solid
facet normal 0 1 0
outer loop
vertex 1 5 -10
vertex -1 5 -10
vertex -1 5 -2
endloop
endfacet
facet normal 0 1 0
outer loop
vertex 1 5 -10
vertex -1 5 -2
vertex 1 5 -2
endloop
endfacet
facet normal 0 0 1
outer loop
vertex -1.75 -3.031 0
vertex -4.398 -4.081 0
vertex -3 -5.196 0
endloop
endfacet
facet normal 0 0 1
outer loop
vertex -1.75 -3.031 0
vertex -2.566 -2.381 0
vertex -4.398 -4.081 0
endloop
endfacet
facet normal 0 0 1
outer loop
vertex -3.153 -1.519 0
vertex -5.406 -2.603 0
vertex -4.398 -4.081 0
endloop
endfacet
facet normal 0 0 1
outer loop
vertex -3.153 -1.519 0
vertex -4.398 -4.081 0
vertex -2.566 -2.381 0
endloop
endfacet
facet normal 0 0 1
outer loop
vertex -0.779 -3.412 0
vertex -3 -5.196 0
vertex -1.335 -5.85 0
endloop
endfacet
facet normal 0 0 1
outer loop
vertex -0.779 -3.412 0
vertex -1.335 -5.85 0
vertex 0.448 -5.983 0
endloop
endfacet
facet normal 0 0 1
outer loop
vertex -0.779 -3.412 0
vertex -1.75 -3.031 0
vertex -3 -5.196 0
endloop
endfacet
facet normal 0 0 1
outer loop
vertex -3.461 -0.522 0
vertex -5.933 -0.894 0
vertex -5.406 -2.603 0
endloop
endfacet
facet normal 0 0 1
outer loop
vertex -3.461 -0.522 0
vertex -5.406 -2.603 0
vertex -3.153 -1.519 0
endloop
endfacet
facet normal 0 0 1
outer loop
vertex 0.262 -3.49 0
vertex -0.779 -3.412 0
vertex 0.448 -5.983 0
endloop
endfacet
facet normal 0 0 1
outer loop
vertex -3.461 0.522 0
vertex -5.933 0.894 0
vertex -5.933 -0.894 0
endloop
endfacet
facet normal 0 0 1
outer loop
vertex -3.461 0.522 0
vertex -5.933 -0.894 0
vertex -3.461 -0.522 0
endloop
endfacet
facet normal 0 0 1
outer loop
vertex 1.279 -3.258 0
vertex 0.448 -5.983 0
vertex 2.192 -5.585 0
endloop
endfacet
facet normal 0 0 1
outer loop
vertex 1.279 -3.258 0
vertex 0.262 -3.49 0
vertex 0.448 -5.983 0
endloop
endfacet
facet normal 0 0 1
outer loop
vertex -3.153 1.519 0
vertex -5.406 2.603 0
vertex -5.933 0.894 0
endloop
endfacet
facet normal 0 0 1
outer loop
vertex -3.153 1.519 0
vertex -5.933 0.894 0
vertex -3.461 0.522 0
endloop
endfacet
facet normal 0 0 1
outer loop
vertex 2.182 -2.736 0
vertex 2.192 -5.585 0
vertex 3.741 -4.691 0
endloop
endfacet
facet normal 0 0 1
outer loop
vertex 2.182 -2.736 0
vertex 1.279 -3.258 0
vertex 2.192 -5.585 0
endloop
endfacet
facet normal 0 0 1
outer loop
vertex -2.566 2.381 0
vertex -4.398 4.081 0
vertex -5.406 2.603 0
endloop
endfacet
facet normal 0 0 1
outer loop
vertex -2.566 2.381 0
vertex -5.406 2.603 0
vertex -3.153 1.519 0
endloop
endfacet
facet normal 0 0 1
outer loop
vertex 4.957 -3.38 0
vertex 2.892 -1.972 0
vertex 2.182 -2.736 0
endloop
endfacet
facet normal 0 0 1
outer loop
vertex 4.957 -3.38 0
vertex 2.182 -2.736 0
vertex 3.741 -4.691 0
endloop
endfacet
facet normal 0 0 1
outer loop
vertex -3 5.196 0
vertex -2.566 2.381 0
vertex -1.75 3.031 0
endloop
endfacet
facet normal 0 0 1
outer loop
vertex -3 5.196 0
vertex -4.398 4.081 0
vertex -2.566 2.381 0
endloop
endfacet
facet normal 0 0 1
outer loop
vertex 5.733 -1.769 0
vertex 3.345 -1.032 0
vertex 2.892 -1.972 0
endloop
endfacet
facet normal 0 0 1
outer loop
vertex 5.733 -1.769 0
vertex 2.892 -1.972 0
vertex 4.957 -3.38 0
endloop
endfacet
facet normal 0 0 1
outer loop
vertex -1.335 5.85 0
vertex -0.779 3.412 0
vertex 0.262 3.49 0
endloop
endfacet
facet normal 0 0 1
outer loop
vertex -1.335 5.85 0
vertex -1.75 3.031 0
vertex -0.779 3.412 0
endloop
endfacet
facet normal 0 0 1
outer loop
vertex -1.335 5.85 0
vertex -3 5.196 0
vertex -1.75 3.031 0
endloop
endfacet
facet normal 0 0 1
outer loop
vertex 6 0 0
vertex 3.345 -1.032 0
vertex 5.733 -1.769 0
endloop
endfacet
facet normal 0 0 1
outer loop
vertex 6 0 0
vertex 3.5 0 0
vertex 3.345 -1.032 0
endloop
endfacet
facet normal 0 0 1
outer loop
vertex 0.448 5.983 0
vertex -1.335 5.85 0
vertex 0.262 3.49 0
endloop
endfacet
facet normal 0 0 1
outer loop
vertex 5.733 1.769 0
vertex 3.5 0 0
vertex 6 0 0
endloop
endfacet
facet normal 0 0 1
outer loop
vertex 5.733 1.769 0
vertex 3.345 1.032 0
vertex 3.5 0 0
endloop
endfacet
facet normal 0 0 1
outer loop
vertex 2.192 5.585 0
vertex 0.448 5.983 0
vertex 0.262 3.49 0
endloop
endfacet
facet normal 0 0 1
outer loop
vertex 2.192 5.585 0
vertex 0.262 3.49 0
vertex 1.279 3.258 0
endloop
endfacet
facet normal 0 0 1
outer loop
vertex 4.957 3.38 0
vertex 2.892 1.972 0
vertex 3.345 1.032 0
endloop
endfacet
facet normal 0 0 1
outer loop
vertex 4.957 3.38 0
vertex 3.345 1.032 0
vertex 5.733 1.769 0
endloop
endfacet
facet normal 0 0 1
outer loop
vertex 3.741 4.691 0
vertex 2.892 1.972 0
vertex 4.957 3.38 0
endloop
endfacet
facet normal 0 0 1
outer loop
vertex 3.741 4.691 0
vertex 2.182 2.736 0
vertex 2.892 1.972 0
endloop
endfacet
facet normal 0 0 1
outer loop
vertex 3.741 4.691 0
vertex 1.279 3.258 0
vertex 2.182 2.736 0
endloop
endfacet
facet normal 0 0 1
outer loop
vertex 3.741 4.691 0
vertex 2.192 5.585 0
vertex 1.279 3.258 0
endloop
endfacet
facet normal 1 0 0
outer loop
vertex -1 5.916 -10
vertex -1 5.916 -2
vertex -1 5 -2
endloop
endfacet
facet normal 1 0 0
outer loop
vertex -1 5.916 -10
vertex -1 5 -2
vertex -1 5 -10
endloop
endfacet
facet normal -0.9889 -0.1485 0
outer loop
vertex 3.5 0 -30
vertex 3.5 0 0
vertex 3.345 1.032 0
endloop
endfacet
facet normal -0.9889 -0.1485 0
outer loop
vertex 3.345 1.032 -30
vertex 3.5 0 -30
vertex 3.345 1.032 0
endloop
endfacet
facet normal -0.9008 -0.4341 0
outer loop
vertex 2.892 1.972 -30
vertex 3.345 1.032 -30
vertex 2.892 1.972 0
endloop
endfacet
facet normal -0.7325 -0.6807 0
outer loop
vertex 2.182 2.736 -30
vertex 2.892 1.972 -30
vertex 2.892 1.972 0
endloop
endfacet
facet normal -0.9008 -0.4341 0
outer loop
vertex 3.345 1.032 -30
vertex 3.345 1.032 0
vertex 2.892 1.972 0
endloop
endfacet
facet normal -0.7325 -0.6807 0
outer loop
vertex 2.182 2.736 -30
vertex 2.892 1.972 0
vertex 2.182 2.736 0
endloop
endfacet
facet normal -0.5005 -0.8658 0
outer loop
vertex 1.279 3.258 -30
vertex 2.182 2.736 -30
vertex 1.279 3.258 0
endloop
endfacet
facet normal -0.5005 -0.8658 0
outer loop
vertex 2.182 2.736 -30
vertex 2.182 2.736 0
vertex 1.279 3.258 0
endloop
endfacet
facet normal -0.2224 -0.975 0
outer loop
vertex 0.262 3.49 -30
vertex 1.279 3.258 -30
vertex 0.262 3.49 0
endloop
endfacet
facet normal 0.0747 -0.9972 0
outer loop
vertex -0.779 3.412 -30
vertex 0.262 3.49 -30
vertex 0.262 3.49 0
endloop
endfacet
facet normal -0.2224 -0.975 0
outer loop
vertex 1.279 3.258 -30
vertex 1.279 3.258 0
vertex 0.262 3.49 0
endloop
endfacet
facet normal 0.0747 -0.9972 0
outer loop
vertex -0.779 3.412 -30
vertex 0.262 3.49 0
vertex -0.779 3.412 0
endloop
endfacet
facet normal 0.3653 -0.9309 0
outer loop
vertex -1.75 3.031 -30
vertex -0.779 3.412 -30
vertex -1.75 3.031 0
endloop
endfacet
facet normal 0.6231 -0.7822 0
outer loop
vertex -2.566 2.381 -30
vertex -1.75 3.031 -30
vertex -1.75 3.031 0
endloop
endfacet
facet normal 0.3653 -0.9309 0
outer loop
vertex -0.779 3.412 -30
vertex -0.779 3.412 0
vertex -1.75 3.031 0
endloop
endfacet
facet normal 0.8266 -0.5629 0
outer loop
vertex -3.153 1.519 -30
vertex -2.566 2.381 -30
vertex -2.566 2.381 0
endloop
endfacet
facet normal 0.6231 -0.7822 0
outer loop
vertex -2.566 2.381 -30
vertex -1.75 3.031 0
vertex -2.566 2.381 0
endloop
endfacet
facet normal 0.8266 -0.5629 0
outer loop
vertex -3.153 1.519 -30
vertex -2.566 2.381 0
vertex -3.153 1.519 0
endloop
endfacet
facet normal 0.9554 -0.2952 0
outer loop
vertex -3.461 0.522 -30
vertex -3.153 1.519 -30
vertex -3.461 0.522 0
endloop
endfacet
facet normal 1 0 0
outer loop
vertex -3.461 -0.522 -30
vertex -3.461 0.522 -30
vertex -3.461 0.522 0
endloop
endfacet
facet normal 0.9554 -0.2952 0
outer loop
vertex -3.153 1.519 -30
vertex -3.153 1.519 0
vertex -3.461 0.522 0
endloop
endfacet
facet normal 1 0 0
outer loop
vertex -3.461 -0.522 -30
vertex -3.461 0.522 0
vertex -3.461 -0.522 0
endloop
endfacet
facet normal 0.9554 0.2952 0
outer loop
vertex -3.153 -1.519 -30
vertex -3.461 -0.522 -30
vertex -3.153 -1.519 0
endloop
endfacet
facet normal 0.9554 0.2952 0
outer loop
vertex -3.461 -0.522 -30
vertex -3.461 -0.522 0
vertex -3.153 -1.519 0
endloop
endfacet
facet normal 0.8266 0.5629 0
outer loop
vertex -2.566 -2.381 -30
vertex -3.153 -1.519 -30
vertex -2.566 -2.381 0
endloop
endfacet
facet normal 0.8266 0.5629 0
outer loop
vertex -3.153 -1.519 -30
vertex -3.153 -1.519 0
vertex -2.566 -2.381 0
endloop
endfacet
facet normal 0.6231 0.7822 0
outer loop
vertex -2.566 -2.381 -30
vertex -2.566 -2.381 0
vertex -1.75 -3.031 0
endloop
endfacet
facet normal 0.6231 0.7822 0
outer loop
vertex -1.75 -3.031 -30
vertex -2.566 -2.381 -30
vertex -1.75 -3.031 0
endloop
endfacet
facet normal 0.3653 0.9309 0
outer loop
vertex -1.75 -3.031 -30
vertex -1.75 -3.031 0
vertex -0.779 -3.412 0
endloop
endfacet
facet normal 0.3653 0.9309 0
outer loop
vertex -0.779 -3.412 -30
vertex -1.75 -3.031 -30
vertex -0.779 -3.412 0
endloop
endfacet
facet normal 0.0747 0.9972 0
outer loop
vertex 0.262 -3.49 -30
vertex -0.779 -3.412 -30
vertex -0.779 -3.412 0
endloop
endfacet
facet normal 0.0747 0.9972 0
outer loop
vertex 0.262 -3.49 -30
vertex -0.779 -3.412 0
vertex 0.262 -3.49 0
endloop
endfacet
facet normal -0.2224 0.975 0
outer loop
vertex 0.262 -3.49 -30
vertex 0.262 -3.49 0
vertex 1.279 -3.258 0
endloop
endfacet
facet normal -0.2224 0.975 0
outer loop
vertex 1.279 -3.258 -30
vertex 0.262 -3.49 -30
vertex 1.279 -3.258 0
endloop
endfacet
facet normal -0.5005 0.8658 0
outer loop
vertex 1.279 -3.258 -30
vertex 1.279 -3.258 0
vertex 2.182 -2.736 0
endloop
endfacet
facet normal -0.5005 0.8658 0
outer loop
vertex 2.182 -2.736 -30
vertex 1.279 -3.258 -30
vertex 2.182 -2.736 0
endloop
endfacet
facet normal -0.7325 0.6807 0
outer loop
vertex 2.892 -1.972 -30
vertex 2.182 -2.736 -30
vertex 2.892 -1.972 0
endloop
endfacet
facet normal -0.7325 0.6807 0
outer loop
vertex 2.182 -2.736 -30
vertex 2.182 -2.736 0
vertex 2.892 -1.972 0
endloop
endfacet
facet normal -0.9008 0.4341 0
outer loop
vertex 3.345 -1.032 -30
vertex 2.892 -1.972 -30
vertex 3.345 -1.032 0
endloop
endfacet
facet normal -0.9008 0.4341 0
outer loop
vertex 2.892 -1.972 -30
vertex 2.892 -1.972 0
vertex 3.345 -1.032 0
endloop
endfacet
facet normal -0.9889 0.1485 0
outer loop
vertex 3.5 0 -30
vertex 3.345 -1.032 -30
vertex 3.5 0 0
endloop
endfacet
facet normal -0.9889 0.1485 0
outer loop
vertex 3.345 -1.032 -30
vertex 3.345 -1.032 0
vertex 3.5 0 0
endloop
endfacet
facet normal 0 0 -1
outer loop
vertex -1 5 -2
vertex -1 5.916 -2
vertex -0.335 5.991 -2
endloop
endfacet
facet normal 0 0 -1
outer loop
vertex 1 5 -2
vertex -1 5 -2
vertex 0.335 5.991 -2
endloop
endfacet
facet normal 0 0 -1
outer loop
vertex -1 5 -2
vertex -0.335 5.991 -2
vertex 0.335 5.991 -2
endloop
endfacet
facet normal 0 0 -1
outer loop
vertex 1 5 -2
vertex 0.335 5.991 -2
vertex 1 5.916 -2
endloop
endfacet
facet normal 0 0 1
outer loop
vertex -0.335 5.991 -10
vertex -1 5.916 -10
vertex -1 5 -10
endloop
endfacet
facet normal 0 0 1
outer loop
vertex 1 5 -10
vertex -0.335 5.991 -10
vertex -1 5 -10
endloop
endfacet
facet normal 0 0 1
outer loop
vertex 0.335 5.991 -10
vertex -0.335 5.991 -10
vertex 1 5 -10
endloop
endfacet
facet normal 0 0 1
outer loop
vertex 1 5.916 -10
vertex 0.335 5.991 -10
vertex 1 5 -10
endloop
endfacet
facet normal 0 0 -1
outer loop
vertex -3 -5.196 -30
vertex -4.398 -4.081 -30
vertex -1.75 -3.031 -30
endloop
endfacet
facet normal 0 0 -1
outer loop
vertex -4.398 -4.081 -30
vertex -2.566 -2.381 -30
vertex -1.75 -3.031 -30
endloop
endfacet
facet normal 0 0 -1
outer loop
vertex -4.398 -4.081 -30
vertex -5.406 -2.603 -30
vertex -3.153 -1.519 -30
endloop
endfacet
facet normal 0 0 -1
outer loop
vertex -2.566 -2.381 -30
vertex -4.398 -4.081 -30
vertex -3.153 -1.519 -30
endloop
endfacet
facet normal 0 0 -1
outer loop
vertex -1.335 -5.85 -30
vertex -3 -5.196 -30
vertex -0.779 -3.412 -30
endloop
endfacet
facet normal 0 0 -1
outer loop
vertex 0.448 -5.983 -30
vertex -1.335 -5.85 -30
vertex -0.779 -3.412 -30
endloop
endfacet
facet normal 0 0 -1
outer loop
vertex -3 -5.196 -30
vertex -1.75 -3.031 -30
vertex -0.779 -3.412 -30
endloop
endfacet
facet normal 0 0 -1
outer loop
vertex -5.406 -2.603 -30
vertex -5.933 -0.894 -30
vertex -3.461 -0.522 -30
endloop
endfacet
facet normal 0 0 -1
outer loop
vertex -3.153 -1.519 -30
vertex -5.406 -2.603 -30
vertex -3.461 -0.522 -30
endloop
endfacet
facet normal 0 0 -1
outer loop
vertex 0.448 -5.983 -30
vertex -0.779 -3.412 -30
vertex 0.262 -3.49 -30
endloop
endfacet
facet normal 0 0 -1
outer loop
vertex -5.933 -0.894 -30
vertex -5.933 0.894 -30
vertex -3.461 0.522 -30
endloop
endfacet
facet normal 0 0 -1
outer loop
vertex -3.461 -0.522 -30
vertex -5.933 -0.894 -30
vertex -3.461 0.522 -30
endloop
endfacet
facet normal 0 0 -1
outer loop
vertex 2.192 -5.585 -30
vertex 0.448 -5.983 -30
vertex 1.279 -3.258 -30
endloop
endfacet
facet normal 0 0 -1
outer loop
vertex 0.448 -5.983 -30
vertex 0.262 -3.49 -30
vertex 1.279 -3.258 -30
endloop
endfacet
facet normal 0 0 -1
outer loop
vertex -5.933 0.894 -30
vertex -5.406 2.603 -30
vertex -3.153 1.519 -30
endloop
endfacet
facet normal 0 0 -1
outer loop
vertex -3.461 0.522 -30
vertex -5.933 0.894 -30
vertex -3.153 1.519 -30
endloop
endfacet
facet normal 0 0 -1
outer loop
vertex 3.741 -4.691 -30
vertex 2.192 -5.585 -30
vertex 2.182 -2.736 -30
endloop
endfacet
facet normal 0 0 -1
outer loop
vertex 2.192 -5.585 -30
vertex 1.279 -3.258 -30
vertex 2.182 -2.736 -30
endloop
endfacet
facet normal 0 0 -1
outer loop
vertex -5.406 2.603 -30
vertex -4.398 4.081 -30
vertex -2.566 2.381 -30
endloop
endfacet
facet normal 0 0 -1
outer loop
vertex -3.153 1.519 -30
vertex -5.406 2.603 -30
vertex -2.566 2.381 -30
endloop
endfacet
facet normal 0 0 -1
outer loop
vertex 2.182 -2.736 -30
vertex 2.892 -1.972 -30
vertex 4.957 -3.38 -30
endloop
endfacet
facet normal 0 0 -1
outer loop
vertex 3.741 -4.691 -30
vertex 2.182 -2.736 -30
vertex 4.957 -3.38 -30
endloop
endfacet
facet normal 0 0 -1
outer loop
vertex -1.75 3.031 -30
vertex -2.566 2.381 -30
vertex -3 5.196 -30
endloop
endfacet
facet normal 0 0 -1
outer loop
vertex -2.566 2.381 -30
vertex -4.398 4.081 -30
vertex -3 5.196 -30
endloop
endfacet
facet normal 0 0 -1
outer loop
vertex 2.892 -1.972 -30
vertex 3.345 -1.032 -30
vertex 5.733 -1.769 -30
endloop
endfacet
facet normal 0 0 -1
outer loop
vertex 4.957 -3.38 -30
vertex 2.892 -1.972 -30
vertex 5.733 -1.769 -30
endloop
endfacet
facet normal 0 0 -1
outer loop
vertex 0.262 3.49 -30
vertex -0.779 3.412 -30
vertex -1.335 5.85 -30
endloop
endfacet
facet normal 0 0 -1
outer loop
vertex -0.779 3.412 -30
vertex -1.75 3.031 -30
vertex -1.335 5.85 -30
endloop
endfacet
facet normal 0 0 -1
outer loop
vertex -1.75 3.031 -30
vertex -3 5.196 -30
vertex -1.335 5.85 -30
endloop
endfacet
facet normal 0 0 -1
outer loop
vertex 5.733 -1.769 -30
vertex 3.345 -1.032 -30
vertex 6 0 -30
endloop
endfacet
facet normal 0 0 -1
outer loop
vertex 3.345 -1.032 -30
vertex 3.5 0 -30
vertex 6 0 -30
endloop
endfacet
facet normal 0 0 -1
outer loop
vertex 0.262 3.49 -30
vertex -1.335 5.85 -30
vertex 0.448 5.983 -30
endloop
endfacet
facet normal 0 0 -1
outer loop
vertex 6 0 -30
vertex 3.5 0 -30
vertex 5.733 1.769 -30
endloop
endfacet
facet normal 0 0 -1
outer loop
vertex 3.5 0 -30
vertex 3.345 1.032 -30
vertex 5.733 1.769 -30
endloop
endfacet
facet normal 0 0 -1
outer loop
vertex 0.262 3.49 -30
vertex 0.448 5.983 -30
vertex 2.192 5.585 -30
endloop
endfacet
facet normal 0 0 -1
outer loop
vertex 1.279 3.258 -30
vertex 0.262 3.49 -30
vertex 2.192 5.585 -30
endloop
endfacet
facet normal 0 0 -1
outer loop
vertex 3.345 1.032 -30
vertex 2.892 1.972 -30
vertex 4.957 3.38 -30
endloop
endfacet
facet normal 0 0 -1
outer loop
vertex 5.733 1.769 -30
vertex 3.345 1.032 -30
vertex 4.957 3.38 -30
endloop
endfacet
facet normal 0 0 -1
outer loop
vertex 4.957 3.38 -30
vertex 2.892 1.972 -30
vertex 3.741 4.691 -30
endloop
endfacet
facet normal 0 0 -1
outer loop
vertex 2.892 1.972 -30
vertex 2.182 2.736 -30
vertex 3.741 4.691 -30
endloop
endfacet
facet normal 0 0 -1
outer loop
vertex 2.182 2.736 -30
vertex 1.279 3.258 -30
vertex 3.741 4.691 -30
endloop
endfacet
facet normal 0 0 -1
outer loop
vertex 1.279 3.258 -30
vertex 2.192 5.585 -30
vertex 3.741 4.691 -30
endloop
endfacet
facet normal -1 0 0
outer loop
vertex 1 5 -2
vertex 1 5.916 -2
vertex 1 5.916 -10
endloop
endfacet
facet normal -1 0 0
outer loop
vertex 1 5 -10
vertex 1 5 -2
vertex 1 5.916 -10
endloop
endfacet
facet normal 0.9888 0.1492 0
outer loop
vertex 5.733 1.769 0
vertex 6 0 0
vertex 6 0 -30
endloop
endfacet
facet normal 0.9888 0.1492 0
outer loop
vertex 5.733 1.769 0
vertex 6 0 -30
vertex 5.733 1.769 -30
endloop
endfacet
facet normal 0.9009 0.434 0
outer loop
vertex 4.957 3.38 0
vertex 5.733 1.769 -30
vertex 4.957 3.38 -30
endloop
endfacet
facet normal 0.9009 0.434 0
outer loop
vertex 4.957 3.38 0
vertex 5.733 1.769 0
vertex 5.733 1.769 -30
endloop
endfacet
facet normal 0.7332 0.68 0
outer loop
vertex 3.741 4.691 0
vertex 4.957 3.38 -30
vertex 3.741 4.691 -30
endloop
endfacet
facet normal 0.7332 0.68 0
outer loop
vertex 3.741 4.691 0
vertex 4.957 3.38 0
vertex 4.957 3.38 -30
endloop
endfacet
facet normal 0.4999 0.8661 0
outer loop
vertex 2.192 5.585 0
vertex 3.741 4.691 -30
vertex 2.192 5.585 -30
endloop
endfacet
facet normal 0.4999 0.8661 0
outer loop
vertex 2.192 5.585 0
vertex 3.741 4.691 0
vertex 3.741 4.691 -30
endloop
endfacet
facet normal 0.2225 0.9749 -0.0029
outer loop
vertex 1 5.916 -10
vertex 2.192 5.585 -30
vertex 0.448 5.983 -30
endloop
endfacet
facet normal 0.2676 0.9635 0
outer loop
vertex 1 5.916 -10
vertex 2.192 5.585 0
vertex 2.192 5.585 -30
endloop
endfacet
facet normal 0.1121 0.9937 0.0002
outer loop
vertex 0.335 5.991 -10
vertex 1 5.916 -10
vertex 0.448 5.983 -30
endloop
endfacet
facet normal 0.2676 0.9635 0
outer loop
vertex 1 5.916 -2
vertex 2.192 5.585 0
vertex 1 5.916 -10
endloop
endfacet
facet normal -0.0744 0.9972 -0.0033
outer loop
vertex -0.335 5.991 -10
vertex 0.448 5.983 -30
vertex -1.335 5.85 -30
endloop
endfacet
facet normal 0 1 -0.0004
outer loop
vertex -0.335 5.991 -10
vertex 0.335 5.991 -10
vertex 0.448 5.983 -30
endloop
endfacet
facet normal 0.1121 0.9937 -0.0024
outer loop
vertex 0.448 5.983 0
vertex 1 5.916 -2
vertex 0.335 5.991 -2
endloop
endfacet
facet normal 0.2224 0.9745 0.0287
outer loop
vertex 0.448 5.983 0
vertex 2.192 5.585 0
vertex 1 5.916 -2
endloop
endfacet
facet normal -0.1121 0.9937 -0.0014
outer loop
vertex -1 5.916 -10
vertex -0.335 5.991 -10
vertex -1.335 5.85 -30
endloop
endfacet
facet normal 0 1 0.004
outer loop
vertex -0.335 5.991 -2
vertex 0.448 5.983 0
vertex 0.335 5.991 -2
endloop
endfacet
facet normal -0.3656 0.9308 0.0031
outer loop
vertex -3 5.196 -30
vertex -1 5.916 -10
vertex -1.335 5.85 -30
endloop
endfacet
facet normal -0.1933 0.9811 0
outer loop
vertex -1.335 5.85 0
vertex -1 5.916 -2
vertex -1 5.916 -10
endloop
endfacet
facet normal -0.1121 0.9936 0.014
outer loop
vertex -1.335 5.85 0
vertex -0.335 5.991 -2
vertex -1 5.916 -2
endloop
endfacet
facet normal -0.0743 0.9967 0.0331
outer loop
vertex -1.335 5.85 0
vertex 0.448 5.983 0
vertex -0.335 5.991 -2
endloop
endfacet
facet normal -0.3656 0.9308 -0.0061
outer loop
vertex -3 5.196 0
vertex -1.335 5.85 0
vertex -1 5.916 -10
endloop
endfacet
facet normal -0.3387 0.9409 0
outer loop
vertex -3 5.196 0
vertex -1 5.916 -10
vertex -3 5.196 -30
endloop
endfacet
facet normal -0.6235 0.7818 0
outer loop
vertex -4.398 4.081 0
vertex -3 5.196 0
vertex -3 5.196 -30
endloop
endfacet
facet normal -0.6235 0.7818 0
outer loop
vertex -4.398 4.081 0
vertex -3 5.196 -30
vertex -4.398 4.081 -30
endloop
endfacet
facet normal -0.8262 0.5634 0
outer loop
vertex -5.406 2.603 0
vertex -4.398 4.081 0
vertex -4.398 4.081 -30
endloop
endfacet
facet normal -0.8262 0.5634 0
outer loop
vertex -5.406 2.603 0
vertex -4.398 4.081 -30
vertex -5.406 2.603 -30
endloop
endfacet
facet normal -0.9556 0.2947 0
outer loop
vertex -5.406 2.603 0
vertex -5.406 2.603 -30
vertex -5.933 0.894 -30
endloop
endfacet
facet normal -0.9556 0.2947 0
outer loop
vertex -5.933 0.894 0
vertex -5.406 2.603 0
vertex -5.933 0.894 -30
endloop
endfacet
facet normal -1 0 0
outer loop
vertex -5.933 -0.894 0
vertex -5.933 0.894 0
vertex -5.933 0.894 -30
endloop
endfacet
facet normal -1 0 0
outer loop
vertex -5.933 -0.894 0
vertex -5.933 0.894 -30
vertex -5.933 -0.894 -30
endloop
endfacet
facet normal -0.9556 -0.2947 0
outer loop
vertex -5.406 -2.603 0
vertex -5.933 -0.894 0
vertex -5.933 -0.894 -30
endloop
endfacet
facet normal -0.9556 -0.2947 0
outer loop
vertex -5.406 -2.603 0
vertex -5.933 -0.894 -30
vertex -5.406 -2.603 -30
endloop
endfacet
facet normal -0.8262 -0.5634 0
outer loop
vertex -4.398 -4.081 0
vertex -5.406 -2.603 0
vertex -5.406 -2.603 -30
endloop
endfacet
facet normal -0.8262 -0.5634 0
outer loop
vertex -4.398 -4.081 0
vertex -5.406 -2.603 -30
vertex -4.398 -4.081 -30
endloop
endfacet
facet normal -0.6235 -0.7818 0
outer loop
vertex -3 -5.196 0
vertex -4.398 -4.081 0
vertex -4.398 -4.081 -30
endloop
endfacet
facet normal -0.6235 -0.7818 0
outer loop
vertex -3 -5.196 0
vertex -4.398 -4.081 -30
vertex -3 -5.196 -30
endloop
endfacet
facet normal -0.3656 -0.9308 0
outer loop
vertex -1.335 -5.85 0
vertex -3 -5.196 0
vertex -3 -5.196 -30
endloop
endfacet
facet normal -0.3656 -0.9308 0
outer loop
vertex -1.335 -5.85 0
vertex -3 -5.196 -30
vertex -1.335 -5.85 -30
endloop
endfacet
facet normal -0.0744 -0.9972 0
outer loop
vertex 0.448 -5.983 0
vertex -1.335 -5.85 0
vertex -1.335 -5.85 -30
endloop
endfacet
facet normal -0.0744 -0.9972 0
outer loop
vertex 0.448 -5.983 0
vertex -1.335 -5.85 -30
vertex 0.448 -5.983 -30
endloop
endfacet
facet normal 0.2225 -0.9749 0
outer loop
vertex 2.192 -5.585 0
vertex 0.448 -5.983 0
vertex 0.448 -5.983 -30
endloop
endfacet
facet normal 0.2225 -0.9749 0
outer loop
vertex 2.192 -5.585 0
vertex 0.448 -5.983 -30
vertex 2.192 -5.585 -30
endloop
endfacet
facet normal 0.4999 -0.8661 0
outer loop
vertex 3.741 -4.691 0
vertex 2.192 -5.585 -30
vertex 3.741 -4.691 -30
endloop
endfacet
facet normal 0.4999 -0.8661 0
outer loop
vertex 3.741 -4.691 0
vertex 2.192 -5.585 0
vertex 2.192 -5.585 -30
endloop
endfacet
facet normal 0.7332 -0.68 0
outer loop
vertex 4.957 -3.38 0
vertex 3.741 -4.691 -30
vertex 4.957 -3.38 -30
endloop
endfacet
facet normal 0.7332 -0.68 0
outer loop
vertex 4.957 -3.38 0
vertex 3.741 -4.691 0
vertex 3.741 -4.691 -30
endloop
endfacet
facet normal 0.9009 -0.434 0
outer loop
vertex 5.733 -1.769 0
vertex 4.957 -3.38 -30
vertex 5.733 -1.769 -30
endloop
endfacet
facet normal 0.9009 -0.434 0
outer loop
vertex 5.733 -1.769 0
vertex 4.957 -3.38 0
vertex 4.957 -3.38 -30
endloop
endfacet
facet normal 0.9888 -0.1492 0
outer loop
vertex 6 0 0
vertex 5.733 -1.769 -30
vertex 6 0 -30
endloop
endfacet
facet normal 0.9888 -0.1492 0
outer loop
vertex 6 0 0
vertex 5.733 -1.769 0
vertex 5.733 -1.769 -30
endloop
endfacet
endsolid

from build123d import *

# Parameters (mm, degrees)
SKETCH1_R           = 6
SKETCH1_R_2         = 3.5
BOSS_EXTRUDE1_DEPTH = 30
SKETCH3_W           = 2
SKETCH3_H           = 8
CUT_EXTRUDE1_DEPTH  = 1


with BuildPart() as part:
    # Sketch1 → Boss-Extrude1 (new body)
    with BuildSketch(Plane.XY):
        Circle(SKETCH1_R)
        Circle(SKETCH1_R_2, mode=Mode.SUBTRACT)
    extrude(amount=-BOSS_EXTRUDE1_DEPTH)

    # Sketch3 → Cut-Extrude1 (cut)
    with BuildSketch(Plane(origin=(0, 6, 0), x_dir=(1, 0, 0), z_dir=(0, 1, 0))):
        with Locations((0, 6)):
            Rectangle(SKETCH3_W, SKETCH3_H)
    extrude(amount=-CUT_EXTRUDE1_DEPTH, mode=Mode.SUBTRACT)


solid = part.part
